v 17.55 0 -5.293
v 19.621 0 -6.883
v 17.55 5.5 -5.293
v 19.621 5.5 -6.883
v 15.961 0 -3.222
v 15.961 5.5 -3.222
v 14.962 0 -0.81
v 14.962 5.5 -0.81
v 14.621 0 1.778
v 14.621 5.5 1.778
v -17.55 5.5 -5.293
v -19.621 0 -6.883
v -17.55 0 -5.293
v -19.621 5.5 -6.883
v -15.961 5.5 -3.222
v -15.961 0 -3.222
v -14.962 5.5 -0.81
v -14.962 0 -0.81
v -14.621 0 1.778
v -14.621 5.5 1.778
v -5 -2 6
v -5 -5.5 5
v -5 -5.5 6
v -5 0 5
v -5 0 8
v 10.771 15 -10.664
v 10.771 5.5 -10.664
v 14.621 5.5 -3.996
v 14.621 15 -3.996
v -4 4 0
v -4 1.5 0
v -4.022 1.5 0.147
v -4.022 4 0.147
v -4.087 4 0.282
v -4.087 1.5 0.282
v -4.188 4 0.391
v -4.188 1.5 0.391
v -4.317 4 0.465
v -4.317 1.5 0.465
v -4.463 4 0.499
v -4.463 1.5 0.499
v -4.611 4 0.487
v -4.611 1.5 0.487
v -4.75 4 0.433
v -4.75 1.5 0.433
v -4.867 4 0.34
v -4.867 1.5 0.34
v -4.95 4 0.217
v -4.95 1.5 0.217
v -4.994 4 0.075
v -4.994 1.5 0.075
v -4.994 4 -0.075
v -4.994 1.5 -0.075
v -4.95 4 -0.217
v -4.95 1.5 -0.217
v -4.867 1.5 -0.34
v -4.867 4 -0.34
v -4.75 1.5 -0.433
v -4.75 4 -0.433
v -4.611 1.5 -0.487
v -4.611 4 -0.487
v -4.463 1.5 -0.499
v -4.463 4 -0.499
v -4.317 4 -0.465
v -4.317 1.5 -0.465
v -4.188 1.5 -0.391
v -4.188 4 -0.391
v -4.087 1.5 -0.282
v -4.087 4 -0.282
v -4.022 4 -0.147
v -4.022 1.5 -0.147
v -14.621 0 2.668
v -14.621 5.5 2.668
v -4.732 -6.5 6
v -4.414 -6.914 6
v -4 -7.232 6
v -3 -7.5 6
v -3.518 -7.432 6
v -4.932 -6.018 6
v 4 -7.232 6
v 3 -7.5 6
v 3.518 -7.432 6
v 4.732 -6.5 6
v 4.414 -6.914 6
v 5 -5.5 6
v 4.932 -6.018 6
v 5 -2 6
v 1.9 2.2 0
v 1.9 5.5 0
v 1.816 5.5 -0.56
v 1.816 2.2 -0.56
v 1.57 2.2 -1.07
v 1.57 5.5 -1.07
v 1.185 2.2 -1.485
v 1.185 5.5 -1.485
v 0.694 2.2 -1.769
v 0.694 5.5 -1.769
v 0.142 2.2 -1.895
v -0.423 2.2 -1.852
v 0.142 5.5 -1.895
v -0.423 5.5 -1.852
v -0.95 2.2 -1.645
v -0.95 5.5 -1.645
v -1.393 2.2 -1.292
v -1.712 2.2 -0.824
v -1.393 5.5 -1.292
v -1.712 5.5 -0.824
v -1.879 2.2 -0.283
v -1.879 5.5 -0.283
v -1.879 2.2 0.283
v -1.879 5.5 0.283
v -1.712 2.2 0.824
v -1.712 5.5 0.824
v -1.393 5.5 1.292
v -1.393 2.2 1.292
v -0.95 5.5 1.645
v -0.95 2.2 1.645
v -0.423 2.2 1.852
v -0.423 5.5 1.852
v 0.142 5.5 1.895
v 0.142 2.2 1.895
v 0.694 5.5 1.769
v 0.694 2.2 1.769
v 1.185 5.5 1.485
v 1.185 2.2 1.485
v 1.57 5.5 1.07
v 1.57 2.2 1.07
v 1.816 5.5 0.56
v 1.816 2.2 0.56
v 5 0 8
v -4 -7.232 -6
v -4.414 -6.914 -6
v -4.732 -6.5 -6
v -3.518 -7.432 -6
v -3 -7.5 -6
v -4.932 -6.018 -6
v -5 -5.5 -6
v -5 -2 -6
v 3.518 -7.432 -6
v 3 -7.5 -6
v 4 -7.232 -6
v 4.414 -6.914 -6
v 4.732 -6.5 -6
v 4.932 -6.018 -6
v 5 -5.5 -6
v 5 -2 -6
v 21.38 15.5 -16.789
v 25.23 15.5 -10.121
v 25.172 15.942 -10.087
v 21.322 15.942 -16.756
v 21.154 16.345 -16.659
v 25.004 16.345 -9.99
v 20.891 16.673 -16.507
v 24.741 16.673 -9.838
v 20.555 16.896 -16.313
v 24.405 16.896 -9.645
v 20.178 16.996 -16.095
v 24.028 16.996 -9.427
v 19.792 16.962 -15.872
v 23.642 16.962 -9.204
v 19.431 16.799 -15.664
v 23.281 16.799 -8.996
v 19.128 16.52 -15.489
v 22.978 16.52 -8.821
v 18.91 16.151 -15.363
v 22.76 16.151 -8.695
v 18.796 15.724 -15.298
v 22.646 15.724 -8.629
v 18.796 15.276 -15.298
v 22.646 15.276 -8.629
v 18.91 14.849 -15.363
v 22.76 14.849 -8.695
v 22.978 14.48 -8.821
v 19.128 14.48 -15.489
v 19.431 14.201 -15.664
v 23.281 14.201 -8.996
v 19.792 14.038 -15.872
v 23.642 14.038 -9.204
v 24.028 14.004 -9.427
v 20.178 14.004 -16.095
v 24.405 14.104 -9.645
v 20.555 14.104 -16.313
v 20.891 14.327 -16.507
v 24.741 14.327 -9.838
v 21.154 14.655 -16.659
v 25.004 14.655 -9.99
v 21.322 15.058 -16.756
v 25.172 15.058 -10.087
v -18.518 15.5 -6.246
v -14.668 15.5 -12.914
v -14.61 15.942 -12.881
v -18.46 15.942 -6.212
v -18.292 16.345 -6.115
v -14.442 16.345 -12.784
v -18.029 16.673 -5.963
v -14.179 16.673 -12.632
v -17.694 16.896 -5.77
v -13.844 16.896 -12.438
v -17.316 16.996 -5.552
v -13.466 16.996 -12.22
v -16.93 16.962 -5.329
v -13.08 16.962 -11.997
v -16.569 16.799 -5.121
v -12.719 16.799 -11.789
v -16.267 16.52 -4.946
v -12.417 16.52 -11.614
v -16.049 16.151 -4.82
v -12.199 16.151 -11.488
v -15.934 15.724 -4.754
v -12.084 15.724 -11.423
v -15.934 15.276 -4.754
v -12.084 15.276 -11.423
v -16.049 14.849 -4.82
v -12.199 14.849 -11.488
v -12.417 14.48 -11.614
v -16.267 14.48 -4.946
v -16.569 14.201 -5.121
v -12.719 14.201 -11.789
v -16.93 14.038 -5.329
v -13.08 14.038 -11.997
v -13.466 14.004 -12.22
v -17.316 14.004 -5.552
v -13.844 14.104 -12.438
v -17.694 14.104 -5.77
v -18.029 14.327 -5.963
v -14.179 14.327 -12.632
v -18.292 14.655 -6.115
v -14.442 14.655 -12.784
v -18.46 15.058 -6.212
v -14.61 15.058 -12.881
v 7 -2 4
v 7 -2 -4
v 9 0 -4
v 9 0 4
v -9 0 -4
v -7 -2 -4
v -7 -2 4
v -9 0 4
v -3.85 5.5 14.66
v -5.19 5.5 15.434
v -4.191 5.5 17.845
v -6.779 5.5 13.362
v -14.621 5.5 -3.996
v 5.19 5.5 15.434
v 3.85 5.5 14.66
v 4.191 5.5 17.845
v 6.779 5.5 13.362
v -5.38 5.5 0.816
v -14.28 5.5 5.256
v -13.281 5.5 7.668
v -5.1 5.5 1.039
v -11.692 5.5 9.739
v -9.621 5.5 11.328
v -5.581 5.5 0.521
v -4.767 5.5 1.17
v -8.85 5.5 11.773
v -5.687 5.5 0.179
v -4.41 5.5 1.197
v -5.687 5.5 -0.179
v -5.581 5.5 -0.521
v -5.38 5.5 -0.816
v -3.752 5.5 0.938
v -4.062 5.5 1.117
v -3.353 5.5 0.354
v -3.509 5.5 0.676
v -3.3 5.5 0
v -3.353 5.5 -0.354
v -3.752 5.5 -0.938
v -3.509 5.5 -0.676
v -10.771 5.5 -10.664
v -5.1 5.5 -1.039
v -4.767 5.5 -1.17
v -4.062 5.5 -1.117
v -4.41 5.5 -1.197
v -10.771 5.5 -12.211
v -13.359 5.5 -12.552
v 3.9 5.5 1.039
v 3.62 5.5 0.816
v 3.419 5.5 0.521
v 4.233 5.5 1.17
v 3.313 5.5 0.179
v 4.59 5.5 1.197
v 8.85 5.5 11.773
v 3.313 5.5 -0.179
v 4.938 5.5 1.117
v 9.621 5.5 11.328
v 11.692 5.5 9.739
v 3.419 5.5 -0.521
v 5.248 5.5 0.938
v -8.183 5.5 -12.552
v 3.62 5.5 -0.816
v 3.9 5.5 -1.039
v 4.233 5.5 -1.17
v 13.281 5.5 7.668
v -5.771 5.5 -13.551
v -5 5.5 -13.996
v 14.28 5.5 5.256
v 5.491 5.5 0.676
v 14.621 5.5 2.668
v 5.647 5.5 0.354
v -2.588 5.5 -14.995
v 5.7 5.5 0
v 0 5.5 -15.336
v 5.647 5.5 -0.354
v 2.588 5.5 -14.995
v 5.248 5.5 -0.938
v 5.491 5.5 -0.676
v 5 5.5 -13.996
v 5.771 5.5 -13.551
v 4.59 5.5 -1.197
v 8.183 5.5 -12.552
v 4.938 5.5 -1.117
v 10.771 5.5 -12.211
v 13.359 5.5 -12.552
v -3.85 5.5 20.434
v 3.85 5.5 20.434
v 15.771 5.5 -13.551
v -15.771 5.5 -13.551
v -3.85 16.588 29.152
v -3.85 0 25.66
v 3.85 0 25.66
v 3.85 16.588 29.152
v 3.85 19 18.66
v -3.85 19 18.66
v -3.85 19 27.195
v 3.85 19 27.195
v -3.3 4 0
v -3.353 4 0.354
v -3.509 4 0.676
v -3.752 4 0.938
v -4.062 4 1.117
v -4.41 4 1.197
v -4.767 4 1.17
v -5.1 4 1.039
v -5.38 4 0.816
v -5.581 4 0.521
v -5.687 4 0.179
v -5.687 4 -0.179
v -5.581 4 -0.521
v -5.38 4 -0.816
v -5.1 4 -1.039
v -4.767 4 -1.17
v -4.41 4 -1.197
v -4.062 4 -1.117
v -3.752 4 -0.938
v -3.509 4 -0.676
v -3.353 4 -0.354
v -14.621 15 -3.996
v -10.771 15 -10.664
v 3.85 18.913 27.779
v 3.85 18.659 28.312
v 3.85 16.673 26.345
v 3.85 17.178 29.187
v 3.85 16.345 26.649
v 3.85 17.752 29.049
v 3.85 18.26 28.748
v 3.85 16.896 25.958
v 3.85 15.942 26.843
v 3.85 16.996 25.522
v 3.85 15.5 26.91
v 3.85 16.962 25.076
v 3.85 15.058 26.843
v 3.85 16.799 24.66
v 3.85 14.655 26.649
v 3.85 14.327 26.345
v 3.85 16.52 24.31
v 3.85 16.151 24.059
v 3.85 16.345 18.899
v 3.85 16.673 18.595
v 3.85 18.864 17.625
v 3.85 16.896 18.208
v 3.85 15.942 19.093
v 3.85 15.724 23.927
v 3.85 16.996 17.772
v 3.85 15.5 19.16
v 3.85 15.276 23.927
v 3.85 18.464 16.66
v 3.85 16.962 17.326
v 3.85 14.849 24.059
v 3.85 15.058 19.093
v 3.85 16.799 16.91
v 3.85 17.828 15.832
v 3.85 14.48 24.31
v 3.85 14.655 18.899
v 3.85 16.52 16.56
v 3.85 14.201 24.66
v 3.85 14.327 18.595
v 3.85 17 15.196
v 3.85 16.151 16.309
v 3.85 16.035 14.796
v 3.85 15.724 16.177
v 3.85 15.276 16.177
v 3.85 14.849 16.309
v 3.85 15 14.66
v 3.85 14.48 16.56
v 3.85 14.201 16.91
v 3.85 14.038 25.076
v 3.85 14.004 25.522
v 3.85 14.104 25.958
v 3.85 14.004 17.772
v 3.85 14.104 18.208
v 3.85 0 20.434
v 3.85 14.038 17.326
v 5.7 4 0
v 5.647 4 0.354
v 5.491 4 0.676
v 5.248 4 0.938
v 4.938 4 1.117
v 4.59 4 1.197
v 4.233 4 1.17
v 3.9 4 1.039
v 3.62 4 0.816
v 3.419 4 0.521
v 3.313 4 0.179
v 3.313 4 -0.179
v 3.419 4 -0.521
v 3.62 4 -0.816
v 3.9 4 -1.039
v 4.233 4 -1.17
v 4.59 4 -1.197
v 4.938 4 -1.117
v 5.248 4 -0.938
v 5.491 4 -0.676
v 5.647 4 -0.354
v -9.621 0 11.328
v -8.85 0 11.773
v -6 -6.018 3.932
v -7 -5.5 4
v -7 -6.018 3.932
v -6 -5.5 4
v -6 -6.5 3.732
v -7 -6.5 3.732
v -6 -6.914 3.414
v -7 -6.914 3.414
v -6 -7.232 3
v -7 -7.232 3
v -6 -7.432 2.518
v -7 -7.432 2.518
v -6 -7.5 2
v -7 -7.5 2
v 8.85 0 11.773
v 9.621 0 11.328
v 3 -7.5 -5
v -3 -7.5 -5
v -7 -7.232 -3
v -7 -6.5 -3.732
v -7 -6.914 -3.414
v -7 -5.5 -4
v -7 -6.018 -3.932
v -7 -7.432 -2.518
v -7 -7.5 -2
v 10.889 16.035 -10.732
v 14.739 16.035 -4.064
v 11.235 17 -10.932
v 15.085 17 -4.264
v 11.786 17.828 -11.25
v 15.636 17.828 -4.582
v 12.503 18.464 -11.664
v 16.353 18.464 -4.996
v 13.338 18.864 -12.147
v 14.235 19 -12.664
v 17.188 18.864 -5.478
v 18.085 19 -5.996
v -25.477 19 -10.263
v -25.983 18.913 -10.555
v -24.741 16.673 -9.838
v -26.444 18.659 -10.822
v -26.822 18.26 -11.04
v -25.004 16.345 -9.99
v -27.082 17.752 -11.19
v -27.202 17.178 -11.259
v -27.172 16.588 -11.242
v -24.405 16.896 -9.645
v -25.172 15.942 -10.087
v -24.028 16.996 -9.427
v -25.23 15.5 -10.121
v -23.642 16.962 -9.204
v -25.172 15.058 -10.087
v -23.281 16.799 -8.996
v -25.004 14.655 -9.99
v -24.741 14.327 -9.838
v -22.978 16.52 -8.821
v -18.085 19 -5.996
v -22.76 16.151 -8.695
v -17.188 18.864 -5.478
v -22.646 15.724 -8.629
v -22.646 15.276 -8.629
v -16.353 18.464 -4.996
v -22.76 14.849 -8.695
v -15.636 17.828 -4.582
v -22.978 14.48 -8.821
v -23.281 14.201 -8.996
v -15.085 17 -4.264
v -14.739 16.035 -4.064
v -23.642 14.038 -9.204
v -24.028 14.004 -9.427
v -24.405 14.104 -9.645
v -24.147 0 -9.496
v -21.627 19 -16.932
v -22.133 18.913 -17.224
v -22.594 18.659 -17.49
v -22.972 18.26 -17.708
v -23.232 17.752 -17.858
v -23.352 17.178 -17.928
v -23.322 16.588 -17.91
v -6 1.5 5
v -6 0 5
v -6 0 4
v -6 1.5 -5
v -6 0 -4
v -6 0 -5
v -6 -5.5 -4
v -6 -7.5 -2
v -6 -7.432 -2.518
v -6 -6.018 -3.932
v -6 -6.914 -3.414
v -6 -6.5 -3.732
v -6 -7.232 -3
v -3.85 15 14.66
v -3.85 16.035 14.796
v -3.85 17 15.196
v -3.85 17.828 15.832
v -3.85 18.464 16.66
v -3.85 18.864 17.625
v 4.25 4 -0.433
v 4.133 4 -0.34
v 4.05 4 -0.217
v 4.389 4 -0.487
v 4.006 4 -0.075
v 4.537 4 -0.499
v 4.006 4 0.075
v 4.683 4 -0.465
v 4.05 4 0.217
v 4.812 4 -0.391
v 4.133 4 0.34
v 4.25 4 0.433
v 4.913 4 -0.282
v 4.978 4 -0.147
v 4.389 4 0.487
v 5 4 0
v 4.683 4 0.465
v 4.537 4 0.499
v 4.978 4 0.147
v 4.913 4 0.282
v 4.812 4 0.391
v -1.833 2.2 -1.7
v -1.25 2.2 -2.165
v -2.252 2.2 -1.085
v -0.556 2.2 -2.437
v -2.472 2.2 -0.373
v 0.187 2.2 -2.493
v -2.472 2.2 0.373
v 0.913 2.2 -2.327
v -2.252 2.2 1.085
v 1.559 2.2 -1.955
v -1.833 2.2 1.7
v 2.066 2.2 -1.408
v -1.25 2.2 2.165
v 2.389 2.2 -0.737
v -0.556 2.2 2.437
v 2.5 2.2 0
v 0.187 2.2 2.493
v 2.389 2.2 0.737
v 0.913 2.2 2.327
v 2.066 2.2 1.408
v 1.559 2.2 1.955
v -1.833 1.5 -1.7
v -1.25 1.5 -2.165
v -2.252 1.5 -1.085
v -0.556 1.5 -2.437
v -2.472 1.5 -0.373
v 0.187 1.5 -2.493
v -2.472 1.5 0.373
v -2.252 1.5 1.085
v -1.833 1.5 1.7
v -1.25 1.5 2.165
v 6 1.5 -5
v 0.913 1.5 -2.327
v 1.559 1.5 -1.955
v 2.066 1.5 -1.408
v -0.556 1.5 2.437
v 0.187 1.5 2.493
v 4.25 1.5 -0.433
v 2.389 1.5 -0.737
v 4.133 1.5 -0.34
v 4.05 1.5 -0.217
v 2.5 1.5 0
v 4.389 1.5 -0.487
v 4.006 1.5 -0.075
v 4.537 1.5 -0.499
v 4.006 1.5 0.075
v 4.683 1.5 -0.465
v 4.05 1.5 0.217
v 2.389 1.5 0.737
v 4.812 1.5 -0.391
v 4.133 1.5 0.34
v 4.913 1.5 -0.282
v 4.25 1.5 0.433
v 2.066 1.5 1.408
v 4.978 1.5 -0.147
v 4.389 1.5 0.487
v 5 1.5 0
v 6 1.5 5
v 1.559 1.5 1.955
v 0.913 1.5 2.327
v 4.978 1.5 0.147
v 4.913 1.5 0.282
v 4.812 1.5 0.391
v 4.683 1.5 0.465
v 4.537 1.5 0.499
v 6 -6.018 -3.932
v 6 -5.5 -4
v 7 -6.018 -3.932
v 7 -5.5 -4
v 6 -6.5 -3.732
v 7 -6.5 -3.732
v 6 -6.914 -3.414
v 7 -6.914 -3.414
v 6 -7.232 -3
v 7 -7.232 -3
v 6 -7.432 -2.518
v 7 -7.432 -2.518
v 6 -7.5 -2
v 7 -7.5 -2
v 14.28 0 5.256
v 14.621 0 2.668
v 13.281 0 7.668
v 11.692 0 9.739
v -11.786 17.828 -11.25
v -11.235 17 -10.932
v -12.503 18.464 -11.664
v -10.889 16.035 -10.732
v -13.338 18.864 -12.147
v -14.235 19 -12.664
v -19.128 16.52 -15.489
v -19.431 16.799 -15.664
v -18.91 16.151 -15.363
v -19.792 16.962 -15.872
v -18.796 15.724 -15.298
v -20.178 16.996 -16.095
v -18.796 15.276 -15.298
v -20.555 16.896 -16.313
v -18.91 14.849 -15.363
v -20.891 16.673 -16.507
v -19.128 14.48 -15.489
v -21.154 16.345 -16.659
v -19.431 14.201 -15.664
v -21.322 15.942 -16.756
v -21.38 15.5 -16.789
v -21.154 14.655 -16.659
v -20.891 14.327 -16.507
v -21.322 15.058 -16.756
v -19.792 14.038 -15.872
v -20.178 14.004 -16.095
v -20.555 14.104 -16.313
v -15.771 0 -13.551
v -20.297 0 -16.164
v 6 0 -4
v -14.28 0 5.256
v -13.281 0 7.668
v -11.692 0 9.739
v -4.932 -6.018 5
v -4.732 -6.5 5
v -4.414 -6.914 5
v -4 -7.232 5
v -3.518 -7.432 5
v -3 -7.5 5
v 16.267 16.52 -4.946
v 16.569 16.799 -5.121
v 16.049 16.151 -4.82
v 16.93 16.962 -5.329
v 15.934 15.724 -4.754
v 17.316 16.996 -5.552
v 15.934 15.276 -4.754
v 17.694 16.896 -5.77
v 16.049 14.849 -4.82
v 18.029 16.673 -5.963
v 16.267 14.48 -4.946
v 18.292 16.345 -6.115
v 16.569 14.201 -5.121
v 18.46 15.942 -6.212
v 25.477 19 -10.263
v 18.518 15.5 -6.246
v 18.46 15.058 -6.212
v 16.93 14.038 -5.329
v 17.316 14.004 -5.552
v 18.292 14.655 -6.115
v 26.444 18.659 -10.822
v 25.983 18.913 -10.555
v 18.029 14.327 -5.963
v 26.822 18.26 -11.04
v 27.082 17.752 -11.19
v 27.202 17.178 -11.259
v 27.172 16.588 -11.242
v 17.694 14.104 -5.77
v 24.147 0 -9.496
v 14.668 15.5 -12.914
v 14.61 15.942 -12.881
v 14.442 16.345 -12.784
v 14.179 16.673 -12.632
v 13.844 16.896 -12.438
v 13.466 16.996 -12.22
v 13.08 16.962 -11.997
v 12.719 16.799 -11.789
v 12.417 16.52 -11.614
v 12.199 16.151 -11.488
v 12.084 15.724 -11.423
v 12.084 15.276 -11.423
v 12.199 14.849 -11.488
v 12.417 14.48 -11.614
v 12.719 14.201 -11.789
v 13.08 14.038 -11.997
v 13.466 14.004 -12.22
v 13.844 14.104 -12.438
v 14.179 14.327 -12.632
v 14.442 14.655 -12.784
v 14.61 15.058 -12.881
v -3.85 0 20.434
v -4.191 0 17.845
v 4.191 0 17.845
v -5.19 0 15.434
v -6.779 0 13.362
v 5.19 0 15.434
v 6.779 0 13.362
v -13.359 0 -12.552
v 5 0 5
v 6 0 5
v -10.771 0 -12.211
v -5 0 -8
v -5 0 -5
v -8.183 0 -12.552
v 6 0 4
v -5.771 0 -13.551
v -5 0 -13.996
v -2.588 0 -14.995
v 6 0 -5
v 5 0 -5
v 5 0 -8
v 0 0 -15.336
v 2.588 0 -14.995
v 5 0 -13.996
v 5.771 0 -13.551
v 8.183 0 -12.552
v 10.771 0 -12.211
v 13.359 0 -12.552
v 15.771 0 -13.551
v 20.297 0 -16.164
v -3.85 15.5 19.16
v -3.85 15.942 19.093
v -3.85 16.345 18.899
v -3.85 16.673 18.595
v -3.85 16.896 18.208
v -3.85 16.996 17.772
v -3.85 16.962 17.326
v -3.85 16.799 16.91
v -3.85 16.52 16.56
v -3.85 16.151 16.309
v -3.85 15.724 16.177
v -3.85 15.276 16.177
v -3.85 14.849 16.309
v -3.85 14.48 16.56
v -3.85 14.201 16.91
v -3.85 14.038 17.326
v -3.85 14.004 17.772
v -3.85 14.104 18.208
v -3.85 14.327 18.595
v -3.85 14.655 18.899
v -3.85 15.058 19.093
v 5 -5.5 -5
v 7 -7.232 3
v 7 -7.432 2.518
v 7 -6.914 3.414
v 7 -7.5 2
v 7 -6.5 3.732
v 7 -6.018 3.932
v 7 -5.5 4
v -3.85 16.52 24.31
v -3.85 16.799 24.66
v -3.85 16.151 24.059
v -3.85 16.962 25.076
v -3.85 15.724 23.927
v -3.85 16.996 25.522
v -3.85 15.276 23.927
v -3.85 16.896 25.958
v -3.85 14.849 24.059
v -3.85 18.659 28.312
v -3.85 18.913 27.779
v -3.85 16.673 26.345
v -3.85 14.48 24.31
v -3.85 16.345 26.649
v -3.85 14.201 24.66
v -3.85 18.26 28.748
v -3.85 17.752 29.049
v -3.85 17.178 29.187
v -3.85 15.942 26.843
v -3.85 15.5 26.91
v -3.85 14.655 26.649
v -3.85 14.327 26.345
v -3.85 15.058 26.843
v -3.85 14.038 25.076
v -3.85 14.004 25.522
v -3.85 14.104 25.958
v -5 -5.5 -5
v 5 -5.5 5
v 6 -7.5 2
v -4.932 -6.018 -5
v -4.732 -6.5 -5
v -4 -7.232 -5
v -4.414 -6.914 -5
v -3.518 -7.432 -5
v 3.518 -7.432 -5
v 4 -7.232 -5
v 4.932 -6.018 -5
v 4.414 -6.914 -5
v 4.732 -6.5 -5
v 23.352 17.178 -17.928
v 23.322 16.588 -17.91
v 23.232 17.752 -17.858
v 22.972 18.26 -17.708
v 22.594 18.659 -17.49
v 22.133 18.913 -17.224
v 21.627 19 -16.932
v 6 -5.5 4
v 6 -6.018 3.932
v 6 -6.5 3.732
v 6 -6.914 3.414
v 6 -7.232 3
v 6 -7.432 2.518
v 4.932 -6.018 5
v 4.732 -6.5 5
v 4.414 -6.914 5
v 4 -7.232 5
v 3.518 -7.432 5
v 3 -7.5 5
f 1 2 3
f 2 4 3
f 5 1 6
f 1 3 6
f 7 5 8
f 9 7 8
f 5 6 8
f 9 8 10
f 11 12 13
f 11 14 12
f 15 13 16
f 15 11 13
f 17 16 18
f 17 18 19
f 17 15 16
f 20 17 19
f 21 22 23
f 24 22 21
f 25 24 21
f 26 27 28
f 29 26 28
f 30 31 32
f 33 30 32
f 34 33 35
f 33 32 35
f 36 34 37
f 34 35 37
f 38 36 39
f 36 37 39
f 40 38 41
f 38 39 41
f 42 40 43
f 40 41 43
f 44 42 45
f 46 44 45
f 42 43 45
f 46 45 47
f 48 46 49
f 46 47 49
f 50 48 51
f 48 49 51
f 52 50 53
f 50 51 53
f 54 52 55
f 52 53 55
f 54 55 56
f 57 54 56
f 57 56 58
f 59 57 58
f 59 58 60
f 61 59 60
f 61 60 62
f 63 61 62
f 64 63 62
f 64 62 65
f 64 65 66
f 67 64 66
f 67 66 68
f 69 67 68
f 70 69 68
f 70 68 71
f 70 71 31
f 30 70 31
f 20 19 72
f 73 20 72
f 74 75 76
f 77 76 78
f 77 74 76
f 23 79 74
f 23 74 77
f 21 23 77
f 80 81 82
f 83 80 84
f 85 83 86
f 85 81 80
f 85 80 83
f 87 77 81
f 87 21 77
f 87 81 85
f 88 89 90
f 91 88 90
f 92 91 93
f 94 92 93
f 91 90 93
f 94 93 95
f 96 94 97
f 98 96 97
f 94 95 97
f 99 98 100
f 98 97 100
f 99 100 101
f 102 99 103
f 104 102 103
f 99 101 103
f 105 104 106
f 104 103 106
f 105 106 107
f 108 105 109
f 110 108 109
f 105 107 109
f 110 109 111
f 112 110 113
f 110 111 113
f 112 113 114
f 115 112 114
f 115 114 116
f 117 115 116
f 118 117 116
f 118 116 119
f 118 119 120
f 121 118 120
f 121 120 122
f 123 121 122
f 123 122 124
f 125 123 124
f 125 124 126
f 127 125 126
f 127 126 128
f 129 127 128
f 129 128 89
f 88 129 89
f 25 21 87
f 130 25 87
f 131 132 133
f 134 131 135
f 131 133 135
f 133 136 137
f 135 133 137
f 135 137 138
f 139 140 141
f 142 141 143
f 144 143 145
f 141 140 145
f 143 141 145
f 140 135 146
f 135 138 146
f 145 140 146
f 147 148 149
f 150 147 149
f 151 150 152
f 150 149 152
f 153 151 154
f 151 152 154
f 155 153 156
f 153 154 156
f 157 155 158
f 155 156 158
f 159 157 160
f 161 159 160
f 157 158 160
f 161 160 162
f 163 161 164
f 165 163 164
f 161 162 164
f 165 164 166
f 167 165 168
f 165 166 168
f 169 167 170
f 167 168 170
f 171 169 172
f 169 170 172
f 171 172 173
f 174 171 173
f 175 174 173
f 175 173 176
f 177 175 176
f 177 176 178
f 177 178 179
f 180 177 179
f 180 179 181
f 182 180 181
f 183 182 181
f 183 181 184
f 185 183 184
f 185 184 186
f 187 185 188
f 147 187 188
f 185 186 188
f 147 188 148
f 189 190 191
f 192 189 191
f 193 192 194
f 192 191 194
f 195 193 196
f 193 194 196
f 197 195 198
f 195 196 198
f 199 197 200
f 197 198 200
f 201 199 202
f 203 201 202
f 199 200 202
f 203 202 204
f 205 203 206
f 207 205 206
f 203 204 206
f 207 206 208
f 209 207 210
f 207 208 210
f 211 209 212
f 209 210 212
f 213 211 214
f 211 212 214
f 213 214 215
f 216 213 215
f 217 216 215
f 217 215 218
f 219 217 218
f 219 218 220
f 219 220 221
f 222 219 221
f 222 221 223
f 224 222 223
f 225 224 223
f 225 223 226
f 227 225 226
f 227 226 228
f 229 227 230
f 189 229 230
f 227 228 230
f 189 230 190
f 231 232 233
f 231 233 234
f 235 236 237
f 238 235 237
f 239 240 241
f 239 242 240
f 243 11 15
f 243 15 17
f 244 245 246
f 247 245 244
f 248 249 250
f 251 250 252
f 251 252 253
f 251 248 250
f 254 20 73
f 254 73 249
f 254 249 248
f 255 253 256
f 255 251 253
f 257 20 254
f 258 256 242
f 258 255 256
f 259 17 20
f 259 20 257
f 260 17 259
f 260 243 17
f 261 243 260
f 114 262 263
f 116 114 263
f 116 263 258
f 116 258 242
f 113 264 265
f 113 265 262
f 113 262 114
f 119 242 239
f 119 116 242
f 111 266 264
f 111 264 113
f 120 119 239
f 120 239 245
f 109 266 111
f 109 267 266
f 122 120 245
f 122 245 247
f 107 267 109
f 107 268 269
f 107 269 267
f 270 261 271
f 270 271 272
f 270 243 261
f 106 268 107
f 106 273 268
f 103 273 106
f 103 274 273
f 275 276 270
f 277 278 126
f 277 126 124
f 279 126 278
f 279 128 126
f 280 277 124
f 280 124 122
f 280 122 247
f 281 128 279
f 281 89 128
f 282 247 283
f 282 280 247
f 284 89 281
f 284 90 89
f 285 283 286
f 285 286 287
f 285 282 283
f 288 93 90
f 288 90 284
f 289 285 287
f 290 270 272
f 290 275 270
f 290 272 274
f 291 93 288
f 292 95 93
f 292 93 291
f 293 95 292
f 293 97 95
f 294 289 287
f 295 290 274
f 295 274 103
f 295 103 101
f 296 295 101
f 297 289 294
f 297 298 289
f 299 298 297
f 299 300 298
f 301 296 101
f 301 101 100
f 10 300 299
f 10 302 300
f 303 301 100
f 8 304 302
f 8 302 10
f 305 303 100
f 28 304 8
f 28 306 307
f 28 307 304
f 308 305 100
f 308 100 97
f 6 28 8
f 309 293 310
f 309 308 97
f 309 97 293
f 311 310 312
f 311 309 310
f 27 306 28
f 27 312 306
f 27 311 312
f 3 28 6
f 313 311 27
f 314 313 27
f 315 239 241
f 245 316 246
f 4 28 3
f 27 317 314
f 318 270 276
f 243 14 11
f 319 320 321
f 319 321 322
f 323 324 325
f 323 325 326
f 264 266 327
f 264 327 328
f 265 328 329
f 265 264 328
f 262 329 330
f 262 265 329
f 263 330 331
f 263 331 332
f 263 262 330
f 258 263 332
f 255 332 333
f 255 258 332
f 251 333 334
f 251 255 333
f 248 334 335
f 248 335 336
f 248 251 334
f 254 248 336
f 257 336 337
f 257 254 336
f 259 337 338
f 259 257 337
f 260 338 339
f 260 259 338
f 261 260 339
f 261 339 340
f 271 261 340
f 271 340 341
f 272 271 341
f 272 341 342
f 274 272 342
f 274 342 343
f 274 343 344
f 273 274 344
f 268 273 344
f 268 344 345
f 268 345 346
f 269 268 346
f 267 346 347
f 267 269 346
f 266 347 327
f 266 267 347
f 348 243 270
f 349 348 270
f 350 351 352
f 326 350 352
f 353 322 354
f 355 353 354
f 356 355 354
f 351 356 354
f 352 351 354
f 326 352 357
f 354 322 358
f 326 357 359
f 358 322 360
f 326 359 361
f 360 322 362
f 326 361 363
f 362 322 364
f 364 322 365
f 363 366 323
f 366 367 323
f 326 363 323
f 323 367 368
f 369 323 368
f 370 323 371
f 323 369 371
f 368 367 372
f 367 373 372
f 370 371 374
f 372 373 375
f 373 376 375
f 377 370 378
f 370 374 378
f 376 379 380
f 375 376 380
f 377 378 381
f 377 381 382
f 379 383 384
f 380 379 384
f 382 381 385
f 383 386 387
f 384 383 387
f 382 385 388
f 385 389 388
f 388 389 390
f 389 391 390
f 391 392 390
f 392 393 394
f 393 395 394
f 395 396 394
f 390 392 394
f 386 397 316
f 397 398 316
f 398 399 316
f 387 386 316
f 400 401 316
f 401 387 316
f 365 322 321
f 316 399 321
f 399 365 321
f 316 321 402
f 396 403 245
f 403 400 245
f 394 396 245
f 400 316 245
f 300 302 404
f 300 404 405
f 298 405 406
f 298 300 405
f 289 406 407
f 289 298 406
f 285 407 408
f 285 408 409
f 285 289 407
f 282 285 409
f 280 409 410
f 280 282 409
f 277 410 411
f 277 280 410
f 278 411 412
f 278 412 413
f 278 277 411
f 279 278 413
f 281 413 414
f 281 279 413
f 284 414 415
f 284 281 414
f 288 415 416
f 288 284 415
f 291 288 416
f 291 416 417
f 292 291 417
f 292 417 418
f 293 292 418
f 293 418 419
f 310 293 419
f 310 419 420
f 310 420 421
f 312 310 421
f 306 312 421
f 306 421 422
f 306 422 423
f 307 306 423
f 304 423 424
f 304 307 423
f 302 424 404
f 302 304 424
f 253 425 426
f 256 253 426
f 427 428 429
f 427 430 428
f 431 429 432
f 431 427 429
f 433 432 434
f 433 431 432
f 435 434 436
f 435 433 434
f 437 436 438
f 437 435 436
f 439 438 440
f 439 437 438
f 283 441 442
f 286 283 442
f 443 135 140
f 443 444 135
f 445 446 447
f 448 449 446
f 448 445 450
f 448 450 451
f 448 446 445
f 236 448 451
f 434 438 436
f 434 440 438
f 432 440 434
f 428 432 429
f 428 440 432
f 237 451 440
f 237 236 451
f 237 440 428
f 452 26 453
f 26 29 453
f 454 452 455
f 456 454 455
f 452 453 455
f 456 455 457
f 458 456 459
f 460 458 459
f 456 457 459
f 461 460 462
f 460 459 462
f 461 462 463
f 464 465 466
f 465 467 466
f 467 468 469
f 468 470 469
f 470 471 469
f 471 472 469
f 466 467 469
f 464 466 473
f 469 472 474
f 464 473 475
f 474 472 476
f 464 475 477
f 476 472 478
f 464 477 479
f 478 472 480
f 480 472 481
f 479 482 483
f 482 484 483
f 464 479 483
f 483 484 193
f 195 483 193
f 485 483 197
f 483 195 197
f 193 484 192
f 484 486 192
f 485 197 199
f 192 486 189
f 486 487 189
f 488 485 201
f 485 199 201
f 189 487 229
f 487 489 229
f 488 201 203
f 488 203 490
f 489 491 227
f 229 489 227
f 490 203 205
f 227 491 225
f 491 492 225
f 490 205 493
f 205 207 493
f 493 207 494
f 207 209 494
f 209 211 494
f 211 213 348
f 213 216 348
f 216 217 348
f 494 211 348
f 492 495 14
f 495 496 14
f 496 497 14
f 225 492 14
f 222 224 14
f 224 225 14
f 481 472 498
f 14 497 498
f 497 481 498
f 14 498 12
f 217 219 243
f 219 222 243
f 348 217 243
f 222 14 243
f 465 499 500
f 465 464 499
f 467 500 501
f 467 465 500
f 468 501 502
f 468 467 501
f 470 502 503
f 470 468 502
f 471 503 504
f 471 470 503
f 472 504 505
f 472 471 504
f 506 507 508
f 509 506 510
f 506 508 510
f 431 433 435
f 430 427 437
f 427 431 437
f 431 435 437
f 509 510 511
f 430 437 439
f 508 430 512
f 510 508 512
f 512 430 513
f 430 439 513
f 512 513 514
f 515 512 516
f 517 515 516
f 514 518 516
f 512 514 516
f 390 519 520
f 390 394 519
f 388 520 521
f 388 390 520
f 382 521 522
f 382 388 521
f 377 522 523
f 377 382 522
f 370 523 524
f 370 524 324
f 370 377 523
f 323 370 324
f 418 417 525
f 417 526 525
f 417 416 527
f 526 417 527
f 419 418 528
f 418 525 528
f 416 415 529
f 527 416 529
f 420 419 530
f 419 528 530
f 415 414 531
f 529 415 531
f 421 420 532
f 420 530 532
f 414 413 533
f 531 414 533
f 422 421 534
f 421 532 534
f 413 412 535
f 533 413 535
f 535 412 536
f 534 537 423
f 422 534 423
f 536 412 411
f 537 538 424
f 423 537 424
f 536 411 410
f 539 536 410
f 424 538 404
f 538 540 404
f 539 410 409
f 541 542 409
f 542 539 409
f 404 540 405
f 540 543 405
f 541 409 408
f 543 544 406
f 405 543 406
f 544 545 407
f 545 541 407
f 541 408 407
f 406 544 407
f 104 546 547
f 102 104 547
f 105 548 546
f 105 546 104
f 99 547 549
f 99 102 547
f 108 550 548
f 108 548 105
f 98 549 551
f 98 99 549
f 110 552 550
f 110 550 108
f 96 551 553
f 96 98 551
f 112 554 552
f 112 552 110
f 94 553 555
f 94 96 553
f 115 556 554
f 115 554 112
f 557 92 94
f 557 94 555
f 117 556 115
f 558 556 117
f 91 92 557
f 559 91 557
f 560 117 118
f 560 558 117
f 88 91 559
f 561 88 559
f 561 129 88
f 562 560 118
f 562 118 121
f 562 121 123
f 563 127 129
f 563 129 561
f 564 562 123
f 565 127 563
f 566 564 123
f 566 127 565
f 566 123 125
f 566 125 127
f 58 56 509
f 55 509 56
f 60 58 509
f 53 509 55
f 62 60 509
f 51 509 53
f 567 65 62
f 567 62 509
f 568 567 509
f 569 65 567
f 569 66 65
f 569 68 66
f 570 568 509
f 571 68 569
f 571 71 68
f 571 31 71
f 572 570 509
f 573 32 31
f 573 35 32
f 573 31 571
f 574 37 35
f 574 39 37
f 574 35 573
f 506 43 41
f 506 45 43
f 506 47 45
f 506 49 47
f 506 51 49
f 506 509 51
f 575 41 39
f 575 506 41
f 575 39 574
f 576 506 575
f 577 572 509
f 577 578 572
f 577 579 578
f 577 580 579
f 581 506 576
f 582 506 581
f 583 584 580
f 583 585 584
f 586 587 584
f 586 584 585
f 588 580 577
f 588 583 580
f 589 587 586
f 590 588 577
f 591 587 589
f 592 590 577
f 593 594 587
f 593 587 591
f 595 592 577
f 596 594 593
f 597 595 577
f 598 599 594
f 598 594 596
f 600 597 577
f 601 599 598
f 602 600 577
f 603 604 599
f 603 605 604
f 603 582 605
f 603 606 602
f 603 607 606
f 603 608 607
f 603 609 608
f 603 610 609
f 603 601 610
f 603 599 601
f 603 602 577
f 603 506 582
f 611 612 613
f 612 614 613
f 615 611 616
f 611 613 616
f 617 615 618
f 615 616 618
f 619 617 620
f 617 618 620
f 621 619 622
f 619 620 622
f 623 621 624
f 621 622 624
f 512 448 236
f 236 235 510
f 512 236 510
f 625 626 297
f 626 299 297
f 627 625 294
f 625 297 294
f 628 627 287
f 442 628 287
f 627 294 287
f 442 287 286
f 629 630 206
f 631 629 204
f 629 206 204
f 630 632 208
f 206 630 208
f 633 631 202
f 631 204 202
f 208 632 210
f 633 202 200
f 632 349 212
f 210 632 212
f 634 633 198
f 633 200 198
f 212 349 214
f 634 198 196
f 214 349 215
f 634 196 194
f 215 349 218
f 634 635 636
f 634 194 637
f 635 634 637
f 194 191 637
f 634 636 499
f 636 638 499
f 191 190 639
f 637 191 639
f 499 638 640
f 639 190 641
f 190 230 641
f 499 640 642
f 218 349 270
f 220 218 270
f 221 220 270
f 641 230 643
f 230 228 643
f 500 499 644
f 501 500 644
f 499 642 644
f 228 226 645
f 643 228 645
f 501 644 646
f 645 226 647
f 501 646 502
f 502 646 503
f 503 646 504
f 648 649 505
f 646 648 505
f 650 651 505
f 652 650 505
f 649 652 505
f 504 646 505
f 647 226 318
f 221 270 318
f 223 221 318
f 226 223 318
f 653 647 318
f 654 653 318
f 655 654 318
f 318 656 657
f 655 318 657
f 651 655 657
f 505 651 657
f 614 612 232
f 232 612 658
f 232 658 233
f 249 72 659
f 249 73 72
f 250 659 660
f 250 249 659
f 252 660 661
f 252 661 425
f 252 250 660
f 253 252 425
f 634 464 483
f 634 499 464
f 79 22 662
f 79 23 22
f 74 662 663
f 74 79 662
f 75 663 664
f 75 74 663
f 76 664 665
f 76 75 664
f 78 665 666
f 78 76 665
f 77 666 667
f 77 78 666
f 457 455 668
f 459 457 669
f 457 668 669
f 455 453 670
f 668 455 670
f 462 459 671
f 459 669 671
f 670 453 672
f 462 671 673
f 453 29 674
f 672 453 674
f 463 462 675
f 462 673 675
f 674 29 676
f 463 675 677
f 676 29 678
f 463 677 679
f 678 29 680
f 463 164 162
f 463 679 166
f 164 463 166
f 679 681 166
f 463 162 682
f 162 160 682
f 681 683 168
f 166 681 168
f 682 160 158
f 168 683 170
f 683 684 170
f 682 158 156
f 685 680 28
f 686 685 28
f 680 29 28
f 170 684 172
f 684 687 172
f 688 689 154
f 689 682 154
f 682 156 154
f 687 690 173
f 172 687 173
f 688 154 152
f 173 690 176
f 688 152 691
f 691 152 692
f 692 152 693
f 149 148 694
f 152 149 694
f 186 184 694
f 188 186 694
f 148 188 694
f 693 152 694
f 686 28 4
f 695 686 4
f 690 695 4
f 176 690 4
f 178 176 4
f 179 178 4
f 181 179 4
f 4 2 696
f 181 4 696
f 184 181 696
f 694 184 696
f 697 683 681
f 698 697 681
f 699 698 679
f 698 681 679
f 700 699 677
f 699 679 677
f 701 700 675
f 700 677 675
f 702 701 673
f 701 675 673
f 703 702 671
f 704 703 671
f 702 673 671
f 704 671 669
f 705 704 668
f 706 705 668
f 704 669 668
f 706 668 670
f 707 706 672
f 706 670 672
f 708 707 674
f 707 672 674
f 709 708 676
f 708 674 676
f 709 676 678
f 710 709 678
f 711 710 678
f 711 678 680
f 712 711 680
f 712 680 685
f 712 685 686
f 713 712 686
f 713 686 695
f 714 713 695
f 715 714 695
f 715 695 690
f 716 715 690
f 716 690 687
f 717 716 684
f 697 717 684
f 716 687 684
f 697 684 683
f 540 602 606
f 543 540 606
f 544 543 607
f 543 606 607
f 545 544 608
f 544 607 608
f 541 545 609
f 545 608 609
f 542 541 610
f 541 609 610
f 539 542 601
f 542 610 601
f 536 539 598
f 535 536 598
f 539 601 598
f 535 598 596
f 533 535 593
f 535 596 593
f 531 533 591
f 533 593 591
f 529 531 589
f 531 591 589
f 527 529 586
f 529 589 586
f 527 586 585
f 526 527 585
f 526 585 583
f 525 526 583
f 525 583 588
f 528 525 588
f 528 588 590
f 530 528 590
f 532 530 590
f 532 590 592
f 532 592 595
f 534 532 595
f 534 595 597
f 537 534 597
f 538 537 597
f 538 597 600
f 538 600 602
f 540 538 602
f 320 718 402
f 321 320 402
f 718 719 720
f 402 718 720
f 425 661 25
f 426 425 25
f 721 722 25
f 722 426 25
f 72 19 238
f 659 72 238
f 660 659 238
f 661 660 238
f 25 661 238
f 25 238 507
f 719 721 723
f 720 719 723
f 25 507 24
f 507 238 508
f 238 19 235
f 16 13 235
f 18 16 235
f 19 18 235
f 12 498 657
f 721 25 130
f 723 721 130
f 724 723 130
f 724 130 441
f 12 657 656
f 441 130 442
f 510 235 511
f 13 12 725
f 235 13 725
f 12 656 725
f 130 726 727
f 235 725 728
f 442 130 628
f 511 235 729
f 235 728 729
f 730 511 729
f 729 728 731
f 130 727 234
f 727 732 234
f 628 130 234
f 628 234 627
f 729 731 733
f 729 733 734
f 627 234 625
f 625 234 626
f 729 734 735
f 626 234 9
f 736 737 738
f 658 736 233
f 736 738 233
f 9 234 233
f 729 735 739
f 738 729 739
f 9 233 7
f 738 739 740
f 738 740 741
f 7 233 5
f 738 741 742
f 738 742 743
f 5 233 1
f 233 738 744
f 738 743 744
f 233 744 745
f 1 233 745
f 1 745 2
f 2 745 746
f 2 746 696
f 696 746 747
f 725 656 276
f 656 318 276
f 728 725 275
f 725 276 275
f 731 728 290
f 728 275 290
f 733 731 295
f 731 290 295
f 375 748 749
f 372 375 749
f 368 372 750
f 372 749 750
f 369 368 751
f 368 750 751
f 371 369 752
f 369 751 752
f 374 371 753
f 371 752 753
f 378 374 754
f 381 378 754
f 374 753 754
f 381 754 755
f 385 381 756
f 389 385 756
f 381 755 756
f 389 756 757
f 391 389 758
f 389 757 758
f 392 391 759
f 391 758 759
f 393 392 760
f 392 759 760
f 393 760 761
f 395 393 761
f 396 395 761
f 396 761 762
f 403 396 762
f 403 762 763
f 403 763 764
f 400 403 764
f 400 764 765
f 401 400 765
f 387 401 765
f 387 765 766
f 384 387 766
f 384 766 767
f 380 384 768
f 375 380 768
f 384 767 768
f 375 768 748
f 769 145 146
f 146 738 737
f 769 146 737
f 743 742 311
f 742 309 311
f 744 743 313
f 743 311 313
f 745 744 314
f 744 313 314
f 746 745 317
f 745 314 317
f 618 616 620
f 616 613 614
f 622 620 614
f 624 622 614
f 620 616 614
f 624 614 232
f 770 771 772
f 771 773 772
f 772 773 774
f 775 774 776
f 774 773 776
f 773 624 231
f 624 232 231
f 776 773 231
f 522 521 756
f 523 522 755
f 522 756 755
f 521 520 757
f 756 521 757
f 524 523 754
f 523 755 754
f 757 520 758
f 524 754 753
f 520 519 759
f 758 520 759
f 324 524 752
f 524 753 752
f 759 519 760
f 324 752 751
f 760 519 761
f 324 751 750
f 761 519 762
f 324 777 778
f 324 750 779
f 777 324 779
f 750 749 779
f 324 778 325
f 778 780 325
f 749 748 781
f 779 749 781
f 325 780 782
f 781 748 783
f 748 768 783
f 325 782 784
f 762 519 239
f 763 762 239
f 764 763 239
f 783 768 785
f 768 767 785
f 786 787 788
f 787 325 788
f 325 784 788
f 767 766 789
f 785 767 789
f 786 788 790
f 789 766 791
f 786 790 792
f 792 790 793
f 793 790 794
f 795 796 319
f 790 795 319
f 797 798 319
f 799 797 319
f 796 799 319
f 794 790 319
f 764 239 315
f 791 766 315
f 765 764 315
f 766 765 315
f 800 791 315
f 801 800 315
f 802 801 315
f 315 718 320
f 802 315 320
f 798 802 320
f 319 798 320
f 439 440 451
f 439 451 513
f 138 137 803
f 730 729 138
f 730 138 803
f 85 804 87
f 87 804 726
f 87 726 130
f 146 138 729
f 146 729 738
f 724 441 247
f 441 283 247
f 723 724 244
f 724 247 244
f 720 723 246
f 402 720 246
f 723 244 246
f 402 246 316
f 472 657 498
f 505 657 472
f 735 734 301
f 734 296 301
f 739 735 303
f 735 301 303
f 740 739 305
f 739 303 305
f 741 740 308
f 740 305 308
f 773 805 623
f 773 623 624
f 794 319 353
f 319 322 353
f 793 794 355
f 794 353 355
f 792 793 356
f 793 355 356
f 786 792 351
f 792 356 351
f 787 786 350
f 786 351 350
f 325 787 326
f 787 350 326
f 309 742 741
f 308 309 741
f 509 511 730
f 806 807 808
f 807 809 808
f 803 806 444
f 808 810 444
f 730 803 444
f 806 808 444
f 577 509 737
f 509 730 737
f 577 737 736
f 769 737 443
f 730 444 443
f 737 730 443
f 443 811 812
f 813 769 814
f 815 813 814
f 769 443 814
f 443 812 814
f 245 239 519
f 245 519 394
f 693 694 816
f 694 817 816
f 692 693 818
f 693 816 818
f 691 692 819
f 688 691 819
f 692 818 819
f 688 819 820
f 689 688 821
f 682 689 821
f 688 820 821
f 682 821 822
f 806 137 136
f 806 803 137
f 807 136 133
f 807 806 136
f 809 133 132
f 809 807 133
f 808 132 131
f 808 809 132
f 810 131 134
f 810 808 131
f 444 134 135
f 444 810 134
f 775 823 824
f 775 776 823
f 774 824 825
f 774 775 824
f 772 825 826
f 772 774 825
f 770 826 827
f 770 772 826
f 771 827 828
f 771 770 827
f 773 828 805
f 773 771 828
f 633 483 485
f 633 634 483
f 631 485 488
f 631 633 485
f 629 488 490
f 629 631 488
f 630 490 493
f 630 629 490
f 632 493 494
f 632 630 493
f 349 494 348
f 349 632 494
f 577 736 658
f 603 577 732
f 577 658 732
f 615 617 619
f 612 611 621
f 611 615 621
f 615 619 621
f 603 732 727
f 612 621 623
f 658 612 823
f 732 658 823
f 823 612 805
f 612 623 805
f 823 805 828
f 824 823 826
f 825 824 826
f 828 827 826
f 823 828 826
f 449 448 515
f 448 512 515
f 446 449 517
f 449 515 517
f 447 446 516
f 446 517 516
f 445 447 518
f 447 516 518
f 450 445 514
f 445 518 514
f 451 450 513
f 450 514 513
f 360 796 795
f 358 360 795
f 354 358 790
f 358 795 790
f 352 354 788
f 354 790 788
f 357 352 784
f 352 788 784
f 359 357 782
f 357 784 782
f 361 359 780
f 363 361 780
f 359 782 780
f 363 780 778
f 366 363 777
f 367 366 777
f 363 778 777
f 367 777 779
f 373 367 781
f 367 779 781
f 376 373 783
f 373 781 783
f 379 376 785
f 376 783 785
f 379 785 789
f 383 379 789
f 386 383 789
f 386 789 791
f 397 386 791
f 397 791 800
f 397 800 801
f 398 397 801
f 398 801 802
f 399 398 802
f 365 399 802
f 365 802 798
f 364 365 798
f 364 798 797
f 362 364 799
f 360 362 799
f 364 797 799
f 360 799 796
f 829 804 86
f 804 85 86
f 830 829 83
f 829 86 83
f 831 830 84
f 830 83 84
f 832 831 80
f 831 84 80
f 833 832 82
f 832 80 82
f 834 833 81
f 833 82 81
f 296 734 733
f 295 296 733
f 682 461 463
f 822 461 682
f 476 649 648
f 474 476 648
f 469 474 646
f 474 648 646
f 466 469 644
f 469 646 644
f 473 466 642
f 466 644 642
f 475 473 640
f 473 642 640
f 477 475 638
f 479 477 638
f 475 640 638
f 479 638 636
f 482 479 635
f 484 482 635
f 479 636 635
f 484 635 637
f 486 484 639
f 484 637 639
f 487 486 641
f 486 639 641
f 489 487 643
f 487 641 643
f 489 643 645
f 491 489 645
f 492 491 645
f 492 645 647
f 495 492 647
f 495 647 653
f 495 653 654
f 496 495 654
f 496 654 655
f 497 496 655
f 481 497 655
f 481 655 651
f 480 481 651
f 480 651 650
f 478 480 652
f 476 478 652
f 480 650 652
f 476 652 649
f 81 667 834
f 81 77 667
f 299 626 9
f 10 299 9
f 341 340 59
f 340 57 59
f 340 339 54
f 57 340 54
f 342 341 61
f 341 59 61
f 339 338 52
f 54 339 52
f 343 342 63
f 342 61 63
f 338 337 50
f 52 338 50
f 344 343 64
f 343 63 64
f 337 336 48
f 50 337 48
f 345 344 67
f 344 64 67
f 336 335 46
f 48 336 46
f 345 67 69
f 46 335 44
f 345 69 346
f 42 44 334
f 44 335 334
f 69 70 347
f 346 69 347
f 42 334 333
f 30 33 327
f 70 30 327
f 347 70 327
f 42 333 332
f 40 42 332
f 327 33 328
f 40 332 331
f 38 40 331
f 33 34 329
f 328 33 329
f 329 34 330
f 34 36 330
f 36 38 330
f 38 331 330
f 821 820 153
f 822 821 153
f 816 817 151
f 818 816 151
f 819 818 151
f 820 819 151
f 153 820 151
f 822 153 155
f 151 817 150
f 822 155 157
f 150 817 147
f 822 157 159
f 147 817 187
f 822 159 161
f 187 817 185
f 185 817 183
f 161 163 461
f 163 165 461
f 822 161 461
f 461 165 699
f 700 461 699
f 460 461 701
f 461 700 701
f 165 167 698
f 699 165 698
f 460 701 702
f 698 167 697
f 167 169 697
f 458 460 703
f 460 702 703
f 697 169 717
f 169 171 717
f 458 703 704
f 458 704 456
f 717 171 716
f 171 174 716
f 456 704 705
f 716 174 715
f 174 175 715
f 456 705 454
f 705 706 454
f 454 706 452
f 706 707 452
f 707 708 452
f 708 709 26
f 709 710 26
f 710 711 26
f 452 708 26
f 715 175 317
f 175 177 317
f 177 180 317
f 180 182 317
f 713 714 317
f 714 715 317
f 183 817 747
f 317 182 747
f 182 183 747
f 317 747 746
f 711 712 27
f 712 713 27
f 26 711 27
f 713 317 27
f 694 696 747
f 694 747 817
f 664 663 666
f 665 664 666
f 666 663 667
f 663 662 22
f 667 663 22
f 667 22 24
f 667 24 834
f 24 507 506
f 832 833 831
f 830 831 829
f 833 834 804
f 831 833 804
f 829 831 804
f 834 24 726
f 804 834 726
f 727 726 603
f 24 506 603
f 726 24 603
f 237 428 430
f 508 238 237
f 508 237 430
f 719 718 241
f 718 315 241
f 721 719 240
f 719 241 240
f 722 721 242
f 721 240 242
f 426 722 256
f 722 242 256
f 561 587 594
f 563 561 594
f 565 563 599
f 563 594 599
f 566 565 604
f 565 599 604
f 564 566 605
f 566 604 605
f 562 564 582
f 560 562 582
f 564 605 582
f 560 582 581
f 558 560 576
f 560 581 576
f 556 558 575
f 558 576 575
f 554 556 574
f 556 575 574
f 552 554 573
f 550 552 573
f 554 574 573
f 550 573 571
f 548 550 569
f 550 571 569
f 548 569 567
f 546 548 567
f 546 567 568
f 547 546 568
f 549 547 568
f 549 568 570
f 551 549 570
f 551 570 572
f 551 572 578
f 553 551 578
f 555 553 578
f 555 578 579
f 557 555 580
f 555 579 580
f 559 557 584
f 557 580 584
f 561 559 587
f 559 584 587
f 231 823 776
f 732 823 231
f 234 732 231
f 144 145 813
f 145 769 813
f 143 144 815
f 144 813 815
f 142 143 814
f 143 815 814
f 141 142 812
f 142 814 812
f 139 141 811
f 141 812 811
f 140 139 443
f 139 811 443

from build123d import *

# Parameters (mm, degrees)
BOSS_EXTRUSION_DEPTH     = 5.5
SCHIZZO2_W               = 7.7
SCHIZZO2_H               = 15
EXTERNAL_EXTRUSION_DEPTH = 13.5
SCHIZZO3_R               = 1.9
CETRAL_HOLE_DEPTH        = 6.5
SKETCH1_R                = 1.5
CUT_EXTRUDE1_DEPTH       = 7.7
CIRPATTERN1_COUNT        = 3
FILLET1_R                = 10
FILLET2_R                = 4
FILLET3_R                = 2
SKETCH2_R                = 0.5
CUT_EXTRUDE2_DEPTH       = 7.7
SKETCH2_5_W              = 1
SKETCH2_5_H              = 8
SKETCH2_5_W_2            = 10
SKETCH2_5_H_2            = 1
BOSS_EXTRUDE1_DEPTH      = 7.5
FILLET4_R                = 2
CHAMFER1_SIZE            = 2
SKETCH2_6_R              = 1.2
SKETCH2_6_R_2            = 1.9
SKETCH2_6_R_3            = 0.5
CUT_EXTRUDE4_DEPTH       = 1.5
CUT_EXTRUDE5_START       = -5.5
SKETCH2_7_R              = 1.2
SKETCH2_7_R_2            = 0.5
CUT_EXTRUDE5_DEPTH       = 1.5
SKETCH4_R                = 2.5
CUT_EXTRUDE6_DEPTH       = 0.7


with BuildPart() as part:
    # Schizzo1 → Boss extrusion (new body)
    with BuildSketch(Plane(origin=(0, 0, 0), x_dir=(1, 0, 0), z_dir=(0, 1, 0))):
        Polygon((-27.611313476, 11.495802195), (-14.620932419, 3.995802195), (-14.620932419, -8.441399268), (-3.85, -14.66), (-3.85, -29.66), (3.85, -29.66), (3.85, -14.66), (14.620932419, -8.441399268), (14.620932419, 3.995802195), (27.611313476, 11.495802195), (23.761313476, 18.164197805), (10.770932419, 10.664197805), (0, 16.882798536), (-10.770932419, 10.664197805), (-23.761313476, 18.164197805), align=None)
    extrude(amount=BOSS_EXTRUSION_DEPTH)

    # Schizzo2 → external extrusion (add)
    with BuildSketch(Plane(origin=(0, 5.5, 0), x_dir=(1, 0, 0), z_dir=(0, 1, 0))):
        Polygon((-23.761313476, 18.164197805), (-27.611313476, 11.495802195), (-14.620932419, 3.995802195), (-10.770932419, 10.664197805), align=None)
        with Locations((0, -22.16)):
            Rectangle(SCHIZZO2_W, SCHIZZO2_H)
        Polygon((10.770932419, 10.664197805), (14.620932419, 3.995802195), (27.611313476, 11.495802195), (23.761313476, 18.164197805), align=None)
    extrude(amount=EXTERNAL_EXTRUSION_DEPTH)

    # Schizzo3 → cetral hole (cut, through all)
    with BuildSketch(Plane(origin=(0, 5.5, 0), x_dir=(1, 0, 0), z_dir=(0, 1, 0))):
        Circle(SCHIZZO3_R)
    extrude(amount=-CETRAL_HOLE_DEPTH, mode=Mode.SUBTRACT)

    # Sketch1 → Cut-Extrude1 (cut)
    with BuildSketch(Plane.ZY.offset(3.85)):
        with Locations((17.66, 15.5)):
            Circle(SKETCH1_R)
        with Locations((25.41, 15.5)):
            Circle(SKETCH1_R)
        Polygon((29.66, 19), (29.66, 0), (25.66, 0), align=None)
    cut_extrude1 = extrude(amount=-CUT_EXTRUDE1_DEPTH, mode=Mode.SUBTRACT)

    # CirPattern1: Cut-Extrude1 ×3 about axis
    cirpattern1_axis = Axis((0, 0, 0), (0, 1, 0))
    for i in range(1, CIRPATTERN1_COUNT):
        add(cut_extrude1.rotate(cirpattern1_axis, i * 360 / CIRPATTERN1_COUNT), mode=Mode.SUBTRACT)

    # Fillet1
    fillet1_edges = [part.edges().sort_by_distance(p)[0] for p in [
        (-3.85, 2.75, 14.66),
        (-14.620932419, 2.75, 8.441399268),
        (-14.620932419, 2.75, -3.995802195),
        (-10.770932419, 2.75, -10.664197805),
        (0, 2.75, -16.882798536),
        (10.770932419, 2.75, -10.664197805),
        (14.620932419, 2.75, -3.995802195),
        (14.620932419, 2.75, 8.441399268),
        (3.85, 2.75, 14.66),
    ]]
    fillet(fillet1_edges, radius=FILLET1_R)

    # Fillet2
    fillet2_edges = [part.edges().sort_by_distance(p)[0] for p in [
        (-12.695932419, 19, -7.33),
        (0, 19, 14.66),
        (12.695932419, 19, -7.33),
    ]]
    fillet(fillet2_edges, radius=FILLET2_R)

    # Fillet3
    fillet3_edges = [part.edges().sort_by_distance(p)[0] for p in [
        (-25.686313476, 19, -14.83),
        (0, 19, 29.66),
        (25.686313476, 19, -14.83),
    ]]
    fillet(fillet3_edges, radius=FILLET3_R)

    # Sketch2 → Cut-Extrude2 (cut)
    with BuildSketch(Plane.XZ):
        with Locations((-4.5, 0)):
            Circle(SKETCH2_R)
        with Locations((4.5, 0)):
            Circle(SKETCH2_R)
    extrude(amount=-CUT_EXTRUDE2_DEPTH, mode=Mode.SUBTRACT)

    # Sketch2<5> → Boss-Extrude1 (add)
    with BuildSketch(Plane.XZ):
        with Locations((6.5, 0)):
            Rectangle(SKETCH2_5_W, SKETCH2_5_H)
        with Locations((0, 5.5)):
            Rectangle(SKETCH2_5_W_2, SKETCH2_5_H_2)
        with Locations((-6.5, 0)):
            Rectangle(SKETCH2_5_W, SKETCH2_5_H)
        with Locations((0, -5.5)):
            Rectangle(SKETCH2_5_W_2, SKETCH2_5_H_2)
    extrude(amount=BOSS_EXTRUDE1_DEPTH)

    # Fillet4
    fillet4_edges = [part.edges().sort_by_distance(p)[0] for p in [
        (6.5, -7.5, 4),
        (6.5, -7.5, -4),
        (-5, -7.5, 5.5),
        (5, -7.5, 5.5),
        (-6.5, -7.5, -4),
        (-6.5, -7.5, 4),
        (5, -7.5, -5.5),
        (-5, -7.5, -5.5),
    ]]
    fillet(fillet4_edges, radius=FILLET4_R)

    # Chamfer1
    chamfer1_edges = [part.edges().sort_by_distance(p)[0] for p in [
        (7, 0, 0),
        (0, 0, 6),
        (-7, 0, 0),
        (0, 0, -6),
    ]]
    chamfer(chamfer1_edges, length=CHAMFER1_SIZE)

    # Sketch2<6> → Cut-Extrude4 (cut)
    with BuildSketch(Plane.XZ):
        Polygon((-6, 4), (-6, -4), (-6, -5), (-5, -5), (5, -5), (6, -5), (6, -4), (6, 4), (6, 5), (5, 5), (-5, 5), (-6, 5), align=None)
        with Locations((-4.5, 0)):
            Circle(SKETCH2_6_R, mode=Mode.SUBTRACT)
        Circle(SKETCH2_6_R_2, mode=Mode.SUBTRACT)
        with Locations((4.5, 0)):
            Circle(SKETCH2_6_R, mode=Mode.SUBTRACT)
        with Locations((-4.5, 0)):
            Circle(SKETCH2_6_R)
        with Locations((-4.5, 0)):
            Circle(SKETCH2_6_R_3, mode=Mode.SUBTRACT)
        with Locations((4.5, 0)):
            Circle(SKETCH2_6_R)
        with Locations((4.5, 0)):
            Circle(SKETCH2_6_R_3, mode=Mode.SUBTRACT)
    extrude(amount=-CUT_EXTRUDE4_DEPTH, mode=Mode.SUBTRACT)

    # Sketch2<7> → Cut-Extrude5 (cut)
    with BuildSketch(Plane.XZ.offset(CUT_EXTRUDE5_START)):
        with Locations((-4.5, 0)):
            Circle(SKETCH2_7_R)
        with Locations((-4.5, 0)):
            Circle(SKETCH2_7_R_2, mode=Mode.SUBTRACT)
        with Locations((4.5, 0)):
            Circle(SKETCH2_7_R)
        with Locations((4.5, 0)):
            Circle(SKETCH2_7_R_2, mode=Mode.SUBTRACT)
    extrude(amount=CUT_EXTRUDE5_DEPTH, mode=Mode.SUBTRACT)

    # Sketch4 → Cut-Extrude6 (cut)
    with BuildSketch(Plane.XZ.offset(-1.5)):
        Circle(SKETCH4_R)
    extrude(amount=-CUT_EXTRUDE6_DEPTH, mode=Mode.SUBTRACT)


solid = part.part
